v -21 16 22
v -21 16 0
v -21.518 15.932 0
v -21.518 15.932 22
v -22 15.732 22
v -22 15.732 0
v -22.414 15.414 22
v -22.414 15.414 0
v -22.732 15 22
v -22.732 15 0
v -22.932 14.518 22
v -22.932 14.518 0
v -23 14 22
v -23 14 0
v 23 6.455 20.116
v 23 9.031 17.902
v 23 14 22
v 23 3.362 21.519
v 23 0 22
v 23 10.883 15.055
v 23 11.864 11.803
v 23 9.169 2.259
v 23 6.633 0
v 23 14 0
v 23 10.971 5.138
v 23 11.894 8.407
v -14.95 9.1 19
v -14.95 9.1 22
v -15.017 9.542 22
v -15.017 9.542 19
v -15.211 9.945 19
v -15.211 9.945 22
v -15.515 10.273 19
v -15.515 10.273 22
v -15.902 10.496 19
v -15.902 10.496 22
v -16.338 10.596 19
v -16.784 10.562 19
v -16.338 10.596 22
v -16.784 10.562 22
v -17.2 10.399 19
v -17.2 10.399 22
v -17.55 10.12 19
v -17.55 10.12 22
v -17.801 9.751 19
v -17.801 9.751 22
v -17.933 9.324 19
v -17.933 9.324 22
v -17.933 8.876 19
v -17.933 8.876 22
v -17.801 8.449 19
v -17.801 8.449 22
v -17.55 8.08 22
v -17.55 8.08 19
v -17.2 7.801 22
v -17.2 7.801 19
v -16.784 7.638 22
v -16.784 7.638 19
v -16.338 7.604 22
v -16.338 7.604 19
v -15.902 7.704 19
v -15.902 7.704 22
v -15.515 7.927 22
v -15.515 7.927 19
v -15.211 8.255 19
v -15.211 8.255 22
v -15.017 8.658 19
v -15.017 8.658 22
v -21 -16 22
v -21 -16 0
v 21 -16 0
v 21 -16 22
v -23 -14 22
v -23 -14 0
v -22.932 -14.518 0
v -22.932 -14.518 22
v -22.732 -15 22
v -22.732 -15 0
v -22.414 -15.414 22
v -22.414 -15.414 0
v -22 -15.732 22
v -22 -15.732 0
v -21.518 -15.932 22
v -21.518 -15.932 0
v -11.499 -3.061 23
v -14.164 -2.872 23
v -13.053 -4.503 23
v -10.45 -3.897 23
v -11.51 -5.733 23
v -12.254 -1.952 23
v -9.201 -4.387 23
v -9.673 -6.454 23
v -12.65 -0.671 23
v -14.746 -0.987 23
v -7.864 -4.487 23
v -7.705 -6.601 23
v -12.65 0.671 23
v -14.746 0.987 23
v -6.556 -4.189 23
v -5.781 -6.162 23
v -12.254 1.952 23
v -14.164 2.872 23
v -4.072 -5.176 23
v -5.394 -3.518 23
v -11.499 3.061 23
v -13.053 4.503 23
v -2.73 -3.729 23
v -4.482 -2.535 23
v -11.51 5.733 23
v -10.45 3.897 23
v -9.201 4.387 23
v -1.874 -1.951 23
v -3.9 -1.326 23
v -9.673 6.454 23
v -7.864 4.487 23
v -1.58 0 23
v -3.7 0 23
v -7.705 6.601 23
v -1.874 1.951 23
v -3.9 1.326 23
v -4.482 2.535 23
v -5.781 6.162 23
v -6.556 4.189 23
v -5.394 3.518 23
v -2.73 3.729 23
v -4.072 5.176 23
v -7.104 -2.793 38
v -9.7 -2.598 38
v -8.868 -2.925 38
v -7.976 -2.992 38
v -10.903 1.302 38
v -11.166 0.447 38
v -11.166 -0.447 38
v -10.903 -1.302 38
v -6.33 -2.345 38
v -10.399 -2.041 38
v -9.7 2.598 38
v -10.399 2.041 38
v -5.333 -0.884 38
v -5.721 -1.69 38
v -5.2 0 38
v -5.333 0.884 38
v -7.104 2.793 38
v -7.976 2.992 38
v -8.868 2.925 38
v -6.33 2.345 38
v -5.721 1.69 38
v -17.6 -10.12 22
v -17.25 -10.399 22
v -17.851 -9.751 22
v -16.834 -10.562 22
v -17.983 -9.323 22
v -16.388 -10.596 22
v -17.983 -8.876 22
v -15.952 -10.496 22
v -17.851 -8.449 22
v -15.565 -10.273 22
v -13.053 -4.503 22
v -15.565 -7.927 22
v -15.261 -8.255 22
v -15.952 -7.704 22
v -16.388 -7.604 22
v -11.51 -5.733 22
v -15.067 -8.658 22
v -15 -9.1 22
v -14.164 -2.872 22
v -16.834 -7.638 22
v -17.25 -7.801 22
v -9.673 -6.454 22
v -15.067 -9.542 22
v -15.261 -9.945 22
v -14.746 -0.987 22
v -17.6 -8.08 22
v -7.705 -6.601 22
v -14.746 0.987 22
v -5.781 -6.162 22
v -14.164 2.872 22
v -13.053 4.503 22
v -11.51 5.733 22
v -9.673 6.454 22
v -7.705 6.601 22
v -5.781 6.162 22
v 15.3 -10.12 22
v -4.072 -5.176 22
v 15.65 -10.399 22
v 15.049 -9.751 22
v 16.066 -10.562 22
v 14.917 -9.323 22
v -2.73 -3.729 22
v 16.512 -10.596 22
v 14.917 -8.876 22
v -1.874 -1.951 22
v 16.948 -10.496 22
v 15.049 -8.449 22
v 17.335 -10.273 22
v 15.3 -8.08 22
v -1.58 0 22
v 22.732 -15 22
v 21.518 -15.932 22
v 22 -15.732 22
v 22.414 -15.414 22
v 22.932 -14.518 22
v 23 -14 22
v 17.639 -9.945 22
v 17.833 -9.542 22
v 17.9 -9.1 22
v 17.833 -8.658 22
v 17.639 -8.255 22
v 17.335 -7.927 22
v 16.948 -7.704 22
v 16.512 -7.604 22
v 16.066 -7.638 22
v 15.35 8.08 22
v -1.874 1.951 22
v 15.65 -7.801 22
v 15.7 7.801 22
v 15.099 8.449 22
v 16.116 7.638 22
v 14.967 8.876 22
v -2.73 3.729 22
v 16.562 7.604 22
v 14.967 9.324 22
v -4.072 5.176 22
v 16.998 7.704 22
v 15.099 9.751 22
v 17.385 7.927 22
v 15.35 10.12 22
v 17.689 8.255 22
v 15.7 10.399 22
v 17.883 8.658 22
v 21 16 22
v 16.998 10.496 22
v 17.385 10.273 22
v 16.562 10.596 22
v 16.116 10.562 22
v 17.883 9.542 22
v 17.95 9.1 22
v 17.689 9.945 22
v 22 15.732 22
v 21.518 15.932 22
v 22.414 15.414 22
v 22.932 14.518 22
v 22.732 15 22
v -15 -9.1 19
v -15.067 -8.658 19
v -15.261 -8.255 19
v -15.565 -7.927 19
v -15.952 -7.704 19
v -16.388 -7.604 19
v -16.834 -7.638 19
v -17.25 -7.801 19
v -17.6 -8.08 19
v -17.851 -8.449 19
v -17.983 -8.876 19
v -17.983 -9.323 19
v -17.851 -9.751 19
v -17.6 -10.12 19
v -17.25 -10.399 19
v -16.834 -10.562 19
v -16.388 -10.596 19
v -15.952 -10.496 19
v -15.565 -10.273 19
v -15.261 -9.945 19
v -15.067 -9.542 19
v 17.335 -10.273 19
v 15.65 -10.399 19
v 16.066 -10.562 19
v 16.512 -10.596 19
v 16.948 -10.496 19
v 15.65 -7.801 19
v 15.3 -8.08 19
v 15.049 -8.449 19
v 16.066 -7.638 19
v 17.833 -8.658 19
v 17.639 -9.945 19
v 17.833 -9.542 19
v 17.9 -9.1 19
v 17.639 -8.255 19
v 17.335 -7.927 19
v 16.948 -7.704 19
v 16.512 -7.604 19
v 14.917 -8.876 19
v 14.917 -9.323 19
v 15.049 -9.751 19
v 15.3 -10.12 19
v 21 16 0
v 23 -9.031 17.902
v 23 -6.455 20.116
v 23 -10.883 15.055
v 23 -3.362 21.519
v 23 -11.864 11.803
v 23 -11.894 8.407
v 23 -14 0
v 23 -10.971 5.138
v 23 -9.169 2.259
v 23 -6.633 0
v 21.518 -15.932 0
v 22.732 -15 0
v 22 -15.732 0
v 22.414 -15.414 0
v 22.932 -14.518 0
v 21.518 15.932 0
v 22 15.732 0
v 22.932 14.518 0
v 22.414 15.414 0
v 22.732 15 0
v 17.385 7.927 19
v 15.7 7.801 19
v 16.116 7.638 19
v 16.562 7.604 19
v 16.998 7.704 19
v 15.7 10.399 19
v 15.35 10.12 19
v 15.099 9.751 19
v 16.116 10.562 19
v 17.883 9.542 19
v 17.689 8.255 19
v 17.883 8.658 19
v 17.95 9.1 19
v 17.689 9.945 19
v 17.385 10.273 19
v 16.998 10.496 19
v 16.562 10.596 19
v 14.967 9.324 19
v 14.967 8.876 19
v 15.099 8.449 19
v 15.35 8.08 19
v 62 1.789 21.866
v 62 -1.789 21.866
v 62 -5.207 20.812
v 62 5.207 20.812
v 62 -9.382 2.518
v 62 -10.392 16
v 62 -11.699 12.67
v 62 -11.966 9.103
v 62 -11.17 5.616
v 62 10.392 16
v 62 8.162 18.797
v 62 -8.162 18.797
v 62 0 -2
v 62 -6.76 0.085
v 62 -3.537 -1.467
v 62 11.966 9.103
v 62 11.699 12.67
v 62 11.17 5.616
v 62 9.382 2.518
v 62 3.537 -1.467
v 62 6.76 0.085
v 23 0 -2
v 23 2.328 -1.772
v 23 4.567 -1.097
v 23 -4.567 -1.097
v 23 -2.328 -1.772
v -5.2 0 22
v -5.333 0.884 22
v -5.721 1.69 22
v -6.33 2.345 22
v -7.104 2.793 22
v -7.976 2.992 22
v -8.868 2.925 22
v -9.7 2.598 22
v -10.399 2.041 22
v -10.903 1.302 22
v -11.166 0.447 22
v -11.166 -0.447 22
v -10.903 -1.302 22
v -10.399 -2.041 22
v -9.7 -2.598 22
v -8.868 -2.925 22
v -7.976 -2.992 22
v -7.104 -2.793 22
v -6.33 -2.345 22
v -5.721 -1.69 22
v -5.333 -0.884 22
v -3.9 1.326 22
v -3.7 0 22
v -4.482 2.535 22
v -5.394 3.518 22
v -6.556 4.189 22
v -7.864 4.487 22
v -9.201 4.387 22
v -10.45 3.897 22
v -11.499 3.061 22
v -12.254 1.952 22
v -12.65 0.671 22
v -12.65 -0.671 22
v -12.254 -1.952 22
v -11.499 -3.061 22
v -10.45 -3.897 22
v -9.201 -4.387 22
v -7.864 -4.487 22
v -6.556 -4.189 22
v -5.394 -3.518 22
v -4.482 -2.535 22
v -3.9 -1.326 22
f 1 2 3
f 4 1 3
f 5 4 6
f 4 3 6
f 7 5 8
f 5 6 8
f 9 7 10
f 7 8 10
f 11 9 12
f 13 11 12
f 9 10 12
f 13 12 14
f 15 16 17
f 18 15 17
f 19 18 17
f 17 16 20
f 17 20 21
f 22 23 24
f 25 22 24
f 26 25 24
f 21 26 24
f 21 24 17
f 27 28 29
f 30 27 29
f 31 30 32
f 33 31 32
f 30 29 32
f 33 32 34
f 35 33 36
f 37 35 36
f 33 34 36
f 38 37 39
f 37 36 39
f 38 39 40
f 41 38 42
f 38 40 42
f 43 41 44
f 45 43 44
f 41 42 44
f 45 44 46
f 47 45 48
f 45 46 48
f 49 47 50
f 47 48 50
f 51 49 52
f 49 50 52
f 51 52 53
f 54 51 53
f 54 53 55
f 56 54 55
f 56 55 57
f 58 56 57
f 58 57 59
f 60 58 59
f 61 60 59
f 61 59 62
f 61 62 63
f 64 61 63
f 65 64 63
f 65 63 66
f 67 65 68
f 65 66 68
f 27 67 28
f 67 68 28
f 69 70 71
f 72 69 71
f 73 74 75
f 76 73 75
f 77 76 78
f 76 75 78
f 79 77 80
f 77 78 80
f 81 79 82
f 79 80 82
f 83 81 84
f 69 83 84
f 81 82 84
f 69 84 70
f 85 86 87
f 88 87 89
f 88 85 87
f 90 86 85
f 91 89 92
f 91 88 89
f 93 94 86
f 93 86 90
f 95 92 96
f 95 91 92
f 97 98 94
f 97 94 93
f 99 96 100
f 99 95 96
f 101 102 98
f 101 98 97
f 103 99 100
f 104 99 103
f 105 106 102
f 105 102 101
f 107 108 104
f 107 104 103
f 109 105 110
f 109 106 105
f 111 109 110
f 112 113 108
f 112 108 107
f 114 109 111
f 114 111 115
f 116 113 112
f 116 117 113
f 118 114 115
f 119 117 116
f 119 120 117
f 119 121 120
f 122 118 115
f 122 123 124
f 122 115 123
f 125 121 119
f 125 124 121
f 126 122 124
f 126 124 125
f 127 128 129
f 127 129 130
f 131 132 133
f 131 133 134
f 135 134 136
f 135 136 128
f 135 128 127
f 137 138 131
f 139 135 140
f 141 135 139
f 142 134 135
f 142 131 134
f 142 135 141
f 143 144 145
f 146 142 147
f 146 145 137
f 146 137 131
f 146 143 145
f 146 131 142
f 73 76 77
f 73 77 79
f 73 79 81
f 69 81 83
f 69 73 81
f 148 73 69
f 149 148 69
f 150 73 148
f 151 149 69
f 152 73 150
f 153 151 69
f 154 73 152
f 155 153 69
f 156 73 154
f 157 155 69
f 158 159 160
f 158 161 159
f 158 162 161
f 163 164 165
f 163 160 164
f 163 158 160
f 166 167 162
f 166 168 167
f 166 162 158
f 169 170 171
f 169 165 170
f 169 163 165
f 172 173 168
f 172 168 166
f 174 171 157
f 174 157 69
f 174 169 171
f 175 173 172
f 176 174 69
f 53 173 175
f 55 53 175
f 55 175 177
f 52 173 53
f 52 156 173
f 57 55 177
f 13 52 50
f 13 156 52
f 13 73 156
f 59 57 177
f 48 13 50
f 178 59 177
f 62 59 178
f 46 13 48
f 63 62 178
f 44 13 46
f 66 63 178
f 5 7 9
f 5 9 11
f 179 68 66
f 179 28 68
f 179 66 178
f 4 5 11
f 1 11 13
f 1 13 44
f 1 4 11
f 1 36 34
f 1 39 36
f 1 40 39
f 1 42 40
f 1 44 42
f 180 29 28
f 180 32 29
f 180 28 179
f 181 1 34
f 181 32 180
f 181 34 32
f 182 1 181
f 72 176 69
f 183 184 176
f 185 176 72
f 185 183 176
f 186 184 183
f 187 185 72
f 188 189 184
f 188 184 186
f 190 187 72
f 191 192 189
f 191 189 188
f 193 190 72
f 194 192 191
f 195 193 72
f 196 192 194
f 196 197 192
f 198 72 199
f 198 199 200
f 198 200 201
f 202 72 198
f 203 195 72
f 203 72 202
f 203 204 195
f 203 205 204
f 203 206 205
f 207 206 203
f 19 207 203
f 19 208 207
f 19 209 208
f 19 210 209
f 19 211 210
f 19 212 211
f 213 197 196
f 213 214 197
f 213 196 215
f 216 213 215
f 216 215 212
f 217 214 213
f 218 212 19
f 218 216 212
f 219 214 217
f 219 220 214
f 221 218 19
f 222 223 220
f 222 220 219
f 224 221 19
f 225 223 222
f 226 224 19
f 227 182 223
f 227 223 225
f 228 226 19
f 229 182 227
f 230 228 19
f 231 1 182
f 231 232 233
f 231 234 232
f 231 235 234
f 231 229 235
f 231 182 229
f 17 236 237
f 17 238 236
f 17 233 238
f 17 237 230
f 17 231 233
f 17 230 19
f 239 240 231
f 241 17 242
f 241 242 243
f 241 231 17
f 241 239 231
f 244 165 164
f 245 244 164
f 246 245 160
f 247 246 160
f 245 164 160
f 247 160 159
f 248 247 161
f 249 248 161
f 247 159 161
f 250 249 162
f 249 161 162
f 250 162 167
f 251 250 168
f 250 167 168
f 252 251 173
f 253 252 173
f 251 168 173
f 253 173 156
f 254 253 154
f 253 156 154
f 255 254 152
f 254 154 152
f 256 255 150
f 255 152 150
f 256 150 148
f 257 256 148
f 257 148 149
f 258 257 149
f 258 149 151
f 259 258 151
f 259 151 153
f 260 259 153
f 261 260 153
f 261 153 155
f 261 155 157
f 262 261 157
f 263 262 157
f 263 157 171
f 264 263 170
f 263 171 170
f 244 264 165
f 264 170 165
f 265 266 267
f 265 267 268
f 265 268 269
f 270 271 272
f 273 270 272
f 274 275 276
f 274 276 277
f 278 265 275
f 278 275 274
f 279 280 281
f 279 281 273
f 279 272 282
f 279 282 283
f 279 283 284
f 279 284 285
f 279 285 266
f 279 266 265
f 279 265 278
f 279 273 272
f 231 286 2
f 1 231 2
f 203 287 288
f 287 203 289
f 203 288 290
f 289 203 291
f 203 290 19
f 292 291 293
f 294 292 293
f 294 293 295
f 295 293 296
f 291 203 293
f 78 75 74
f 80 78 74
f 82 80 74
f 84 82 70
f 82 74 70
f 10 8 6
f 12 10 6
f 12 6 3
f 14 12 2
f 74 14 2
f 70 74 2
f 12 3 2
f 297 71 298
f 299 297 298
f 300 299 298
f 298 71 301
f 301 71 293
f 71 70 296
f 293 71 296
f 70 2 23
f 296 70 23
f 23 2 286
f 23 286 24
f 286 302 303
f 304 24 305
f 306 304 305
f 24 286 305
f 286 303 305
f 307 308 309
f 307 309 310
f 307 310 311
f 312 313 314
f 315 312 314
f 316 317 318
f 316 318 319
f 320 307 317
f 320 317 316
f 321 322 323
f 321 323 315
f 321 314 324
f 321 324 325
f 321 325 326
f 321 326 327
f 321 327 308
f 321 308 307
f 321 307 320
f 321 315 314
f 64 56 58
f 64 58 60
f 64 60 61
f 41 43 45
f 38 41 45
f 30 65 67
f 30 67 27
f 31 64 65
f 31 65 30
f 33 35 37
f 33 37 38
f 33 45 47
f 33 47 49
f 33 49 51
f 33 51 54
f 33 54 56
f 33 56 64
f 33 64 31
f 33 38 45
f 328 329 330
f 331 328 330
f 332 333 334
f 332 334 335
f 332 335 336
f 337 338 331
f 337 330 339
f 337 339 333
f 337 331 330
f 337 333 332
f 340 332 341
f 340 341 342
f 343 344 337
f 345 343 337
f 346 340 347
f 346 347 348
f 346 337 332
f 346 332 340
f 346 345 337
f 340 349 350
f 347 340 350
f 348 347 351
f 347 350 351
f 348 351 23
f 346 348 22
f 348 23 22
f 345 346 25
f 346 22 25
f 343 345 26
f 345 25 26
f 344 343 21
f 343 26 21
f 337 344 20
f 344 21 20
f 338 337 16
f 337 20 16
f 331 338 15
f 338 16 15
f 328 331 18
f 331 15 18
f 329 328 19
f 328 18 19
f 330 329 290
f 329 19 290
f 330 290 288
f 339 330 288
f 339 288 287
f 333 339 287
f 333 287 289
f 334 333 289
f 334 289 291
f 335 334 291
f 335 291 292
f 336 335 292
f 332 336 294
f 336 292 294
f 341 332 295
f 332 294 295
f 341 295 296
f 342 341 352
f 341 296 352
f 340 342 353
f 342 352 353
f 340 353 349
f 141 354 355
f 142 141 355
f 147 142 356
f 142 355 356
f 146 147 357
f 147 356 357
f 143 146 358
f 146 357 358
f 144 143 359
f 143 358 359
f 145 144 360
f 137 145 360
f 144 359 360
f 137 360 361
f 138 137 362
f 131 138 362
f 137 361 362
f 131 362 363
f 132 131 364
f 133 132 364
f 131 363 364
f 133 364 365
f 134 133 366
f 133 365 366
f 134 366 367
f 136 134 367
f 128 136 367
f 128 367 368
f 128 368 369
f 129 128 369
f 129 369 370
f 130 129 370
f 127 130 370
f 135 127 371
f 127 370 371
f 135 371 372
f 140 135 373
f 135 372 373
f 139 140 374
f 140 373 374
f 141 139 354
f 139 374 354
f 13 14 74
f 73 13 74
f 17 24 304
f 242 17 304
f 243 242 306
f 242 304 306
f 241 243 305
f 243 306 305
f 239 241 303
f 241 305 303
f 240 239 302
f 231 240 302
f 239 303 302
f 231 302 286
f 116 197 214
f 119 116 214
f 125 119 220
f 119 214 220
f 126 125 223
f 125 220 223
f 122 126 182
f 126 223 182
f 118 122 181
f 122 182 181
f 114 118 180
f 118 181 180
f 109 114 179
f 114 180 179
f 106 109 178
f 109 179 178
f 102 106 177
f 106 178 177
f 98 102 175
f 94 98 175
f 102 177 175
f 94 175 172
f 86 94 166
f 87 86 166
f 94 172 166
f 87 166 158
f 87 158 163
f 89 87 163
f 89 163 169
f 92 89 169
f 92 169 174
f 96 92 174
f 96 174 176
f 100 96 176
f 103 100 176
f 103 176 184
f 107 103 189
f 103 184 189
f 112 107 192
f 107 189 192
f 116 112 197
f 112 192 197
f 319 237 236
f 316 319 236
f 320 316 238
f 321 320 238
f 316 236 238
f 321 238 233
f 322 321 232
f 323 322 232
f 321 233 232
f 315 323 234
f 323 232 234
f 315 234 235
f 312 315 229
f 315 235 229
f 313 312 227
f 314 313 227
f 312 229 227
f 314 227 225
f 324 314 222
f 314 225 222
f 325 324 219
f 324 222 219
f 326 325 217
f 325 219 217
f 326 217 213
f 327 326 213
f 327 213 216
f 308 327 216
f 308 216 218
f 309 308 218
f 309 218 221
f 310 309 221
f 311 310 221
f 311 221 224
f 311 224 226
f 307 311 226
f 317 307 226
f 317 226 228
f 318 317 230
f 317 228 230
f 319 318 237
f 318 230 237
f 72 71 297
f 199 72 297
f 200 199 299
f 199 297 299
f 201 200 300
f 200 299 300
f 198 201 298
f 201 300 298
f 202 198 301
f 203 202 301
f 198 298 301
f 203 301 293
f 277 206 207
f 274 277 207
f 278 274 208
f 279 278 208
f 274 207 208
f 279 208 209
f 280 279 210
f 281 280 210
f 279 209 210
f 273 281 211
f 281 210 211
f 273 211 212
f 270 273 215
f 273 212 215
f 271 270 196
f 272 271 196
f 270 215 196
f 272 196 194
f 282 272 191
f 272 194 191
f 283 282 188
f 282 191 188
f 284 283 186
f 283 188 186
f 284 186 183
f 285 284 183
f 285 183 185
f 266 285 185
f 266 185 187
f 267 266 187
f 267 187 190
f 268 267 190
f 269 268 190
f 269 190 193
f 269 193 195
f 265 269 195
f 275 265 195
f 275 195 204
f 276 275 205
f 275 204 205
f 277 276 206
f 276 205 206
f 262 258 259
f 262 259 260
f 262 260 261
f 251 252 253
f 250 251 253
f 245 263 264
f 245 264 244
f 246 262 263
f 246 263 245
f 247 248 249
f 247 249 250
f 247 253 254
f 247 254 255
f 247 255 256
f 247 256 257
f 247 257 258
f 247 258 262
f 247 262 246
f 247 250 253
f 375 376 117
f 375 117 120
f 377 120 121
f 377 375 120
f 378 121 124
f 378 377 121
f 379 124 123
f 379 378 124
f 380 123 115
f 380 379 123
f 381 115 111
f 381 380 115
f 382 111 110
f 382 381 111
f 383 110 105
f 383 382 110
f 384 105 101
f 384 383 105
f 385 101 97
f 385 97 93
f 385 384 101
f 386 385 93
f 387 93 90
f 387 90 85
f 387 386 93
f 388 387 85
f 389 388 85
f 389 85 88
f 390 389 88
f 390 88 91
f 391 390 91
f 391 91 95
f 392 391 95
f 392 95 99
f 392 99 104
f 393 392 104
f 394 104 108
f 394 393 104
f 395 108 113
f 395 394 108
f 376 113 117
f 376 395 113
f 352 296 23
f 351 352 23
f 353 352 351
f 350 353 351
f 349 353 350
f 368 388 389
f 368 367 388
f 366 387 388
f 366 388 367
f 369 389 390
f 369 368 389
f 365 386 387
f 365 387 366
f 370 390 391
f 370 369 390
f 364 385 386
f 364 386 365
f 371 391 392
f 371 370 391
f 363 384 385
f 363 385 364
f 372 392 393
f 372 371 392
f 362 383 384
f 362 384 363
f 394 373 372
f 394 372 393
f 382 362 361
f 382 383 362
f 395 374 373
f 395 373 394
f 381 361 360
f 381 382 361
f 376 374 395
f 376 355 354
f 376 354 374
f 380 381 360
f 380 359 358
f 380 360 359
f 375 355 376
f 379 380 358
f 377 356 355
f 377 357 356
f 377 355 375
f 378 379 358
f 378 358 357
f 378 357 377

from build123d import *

# Parameters (mm, degrees)
BOSS_EXTRUDE1_DEPTH = 22
SKETCH2_R           = 1.5
CUT_EXTRUDE1_DEPTH  = 3
SKETCH3_R           = 6.62
SKETCH3_R_2         = 4.5
BOSS_EXTRUDE2_DEPTH = 1
SKETCH3_3_R         = 3
BOSS_EXTRUDE3_DEPTH = 16
SKETCH4_R           = 12
BOSS_EXTRUDE4_DEPTH = 39


with BuildPart() as part:
    # Sketch1 → Boss-Extrude1 (new body)
    with BuildSketch(Plane.XY):
        with BuildLine():
            Line((-21, -16), (21, -16))
            ThreePointArc((21, -16), (22.414213562, -15.414213562), (23, -14))
            Line((23, -14), (23, 14))
            ThreePointArc((23, 14), (22.414213562, 15.414213562), (21, 16))
            Line((21, 16), (-21, 16))
            ThreePointArc((-21, 16), (-22.414213562, 15.414213562), (-23, 14))
            Line((-23, 14), (-23, -14))
            ThreePointArc((-23, -14), (-22.414213562, -15.414213562), (-21, -16))
        make_face()
    extrude(amount=BOSS_EXTRUDE1_DEPTH)

    # Sketch2 → Cut-Extrude1 (cut)
    with BuildSketch(Plane.XY.offset(22)):
        with Locations((-16.45, 9.1)):
            Circle(SKETCH2_R)
        with Locations((16.45, 9.1)):
            Circle(SKETCH2_R)
        with Locations((16.4, -9.099931319)):
            Circle(SKETCH2_R)
        with Locations((-16.5, -9.099931319)):
            Circle(SKETCH2_R)
    extrude(amount=-CUT_EXTRUDE1_DEPTH, mode=Mode.SUBTRACT)

    # Sketch3 → Boss-Extrude2 (add)
    with BuildSketch(Plane.XY.offset(22)):
        with Locations((-8.2, 0)):
            Circle(SKETCH3_R)
        with Locations((-8.2, 0)):
            Circle(SKETCH3_R_2, mode=Mode.SUBTRACT)
    extrude(amount=BOSS_EXTRUDE2_DEPTH)

    # Sketch3<3> → Boss-Extrude3 (add)
    with BuildSketch(Plane.XY.offset(22)):
        with Locations((-8.2, 0)):
            Circle(SKETCH3_3_R)
    extrude(amount=BOSS_EXTRUDE3_DEPTH)

    # Sketch4 → Boss-Extrude4 (add)
    with BuildSketch(Plane(origin=(23, 0, 0), x_dir=(0, 0, -1), z_dir=(1, 0, 0))):
        with Locations((-10, 0)):
            Circle(SKETCH4_R)
    extrude(amount=BOSS_EXTRUDE4_DEPTH)


solid = part.part
